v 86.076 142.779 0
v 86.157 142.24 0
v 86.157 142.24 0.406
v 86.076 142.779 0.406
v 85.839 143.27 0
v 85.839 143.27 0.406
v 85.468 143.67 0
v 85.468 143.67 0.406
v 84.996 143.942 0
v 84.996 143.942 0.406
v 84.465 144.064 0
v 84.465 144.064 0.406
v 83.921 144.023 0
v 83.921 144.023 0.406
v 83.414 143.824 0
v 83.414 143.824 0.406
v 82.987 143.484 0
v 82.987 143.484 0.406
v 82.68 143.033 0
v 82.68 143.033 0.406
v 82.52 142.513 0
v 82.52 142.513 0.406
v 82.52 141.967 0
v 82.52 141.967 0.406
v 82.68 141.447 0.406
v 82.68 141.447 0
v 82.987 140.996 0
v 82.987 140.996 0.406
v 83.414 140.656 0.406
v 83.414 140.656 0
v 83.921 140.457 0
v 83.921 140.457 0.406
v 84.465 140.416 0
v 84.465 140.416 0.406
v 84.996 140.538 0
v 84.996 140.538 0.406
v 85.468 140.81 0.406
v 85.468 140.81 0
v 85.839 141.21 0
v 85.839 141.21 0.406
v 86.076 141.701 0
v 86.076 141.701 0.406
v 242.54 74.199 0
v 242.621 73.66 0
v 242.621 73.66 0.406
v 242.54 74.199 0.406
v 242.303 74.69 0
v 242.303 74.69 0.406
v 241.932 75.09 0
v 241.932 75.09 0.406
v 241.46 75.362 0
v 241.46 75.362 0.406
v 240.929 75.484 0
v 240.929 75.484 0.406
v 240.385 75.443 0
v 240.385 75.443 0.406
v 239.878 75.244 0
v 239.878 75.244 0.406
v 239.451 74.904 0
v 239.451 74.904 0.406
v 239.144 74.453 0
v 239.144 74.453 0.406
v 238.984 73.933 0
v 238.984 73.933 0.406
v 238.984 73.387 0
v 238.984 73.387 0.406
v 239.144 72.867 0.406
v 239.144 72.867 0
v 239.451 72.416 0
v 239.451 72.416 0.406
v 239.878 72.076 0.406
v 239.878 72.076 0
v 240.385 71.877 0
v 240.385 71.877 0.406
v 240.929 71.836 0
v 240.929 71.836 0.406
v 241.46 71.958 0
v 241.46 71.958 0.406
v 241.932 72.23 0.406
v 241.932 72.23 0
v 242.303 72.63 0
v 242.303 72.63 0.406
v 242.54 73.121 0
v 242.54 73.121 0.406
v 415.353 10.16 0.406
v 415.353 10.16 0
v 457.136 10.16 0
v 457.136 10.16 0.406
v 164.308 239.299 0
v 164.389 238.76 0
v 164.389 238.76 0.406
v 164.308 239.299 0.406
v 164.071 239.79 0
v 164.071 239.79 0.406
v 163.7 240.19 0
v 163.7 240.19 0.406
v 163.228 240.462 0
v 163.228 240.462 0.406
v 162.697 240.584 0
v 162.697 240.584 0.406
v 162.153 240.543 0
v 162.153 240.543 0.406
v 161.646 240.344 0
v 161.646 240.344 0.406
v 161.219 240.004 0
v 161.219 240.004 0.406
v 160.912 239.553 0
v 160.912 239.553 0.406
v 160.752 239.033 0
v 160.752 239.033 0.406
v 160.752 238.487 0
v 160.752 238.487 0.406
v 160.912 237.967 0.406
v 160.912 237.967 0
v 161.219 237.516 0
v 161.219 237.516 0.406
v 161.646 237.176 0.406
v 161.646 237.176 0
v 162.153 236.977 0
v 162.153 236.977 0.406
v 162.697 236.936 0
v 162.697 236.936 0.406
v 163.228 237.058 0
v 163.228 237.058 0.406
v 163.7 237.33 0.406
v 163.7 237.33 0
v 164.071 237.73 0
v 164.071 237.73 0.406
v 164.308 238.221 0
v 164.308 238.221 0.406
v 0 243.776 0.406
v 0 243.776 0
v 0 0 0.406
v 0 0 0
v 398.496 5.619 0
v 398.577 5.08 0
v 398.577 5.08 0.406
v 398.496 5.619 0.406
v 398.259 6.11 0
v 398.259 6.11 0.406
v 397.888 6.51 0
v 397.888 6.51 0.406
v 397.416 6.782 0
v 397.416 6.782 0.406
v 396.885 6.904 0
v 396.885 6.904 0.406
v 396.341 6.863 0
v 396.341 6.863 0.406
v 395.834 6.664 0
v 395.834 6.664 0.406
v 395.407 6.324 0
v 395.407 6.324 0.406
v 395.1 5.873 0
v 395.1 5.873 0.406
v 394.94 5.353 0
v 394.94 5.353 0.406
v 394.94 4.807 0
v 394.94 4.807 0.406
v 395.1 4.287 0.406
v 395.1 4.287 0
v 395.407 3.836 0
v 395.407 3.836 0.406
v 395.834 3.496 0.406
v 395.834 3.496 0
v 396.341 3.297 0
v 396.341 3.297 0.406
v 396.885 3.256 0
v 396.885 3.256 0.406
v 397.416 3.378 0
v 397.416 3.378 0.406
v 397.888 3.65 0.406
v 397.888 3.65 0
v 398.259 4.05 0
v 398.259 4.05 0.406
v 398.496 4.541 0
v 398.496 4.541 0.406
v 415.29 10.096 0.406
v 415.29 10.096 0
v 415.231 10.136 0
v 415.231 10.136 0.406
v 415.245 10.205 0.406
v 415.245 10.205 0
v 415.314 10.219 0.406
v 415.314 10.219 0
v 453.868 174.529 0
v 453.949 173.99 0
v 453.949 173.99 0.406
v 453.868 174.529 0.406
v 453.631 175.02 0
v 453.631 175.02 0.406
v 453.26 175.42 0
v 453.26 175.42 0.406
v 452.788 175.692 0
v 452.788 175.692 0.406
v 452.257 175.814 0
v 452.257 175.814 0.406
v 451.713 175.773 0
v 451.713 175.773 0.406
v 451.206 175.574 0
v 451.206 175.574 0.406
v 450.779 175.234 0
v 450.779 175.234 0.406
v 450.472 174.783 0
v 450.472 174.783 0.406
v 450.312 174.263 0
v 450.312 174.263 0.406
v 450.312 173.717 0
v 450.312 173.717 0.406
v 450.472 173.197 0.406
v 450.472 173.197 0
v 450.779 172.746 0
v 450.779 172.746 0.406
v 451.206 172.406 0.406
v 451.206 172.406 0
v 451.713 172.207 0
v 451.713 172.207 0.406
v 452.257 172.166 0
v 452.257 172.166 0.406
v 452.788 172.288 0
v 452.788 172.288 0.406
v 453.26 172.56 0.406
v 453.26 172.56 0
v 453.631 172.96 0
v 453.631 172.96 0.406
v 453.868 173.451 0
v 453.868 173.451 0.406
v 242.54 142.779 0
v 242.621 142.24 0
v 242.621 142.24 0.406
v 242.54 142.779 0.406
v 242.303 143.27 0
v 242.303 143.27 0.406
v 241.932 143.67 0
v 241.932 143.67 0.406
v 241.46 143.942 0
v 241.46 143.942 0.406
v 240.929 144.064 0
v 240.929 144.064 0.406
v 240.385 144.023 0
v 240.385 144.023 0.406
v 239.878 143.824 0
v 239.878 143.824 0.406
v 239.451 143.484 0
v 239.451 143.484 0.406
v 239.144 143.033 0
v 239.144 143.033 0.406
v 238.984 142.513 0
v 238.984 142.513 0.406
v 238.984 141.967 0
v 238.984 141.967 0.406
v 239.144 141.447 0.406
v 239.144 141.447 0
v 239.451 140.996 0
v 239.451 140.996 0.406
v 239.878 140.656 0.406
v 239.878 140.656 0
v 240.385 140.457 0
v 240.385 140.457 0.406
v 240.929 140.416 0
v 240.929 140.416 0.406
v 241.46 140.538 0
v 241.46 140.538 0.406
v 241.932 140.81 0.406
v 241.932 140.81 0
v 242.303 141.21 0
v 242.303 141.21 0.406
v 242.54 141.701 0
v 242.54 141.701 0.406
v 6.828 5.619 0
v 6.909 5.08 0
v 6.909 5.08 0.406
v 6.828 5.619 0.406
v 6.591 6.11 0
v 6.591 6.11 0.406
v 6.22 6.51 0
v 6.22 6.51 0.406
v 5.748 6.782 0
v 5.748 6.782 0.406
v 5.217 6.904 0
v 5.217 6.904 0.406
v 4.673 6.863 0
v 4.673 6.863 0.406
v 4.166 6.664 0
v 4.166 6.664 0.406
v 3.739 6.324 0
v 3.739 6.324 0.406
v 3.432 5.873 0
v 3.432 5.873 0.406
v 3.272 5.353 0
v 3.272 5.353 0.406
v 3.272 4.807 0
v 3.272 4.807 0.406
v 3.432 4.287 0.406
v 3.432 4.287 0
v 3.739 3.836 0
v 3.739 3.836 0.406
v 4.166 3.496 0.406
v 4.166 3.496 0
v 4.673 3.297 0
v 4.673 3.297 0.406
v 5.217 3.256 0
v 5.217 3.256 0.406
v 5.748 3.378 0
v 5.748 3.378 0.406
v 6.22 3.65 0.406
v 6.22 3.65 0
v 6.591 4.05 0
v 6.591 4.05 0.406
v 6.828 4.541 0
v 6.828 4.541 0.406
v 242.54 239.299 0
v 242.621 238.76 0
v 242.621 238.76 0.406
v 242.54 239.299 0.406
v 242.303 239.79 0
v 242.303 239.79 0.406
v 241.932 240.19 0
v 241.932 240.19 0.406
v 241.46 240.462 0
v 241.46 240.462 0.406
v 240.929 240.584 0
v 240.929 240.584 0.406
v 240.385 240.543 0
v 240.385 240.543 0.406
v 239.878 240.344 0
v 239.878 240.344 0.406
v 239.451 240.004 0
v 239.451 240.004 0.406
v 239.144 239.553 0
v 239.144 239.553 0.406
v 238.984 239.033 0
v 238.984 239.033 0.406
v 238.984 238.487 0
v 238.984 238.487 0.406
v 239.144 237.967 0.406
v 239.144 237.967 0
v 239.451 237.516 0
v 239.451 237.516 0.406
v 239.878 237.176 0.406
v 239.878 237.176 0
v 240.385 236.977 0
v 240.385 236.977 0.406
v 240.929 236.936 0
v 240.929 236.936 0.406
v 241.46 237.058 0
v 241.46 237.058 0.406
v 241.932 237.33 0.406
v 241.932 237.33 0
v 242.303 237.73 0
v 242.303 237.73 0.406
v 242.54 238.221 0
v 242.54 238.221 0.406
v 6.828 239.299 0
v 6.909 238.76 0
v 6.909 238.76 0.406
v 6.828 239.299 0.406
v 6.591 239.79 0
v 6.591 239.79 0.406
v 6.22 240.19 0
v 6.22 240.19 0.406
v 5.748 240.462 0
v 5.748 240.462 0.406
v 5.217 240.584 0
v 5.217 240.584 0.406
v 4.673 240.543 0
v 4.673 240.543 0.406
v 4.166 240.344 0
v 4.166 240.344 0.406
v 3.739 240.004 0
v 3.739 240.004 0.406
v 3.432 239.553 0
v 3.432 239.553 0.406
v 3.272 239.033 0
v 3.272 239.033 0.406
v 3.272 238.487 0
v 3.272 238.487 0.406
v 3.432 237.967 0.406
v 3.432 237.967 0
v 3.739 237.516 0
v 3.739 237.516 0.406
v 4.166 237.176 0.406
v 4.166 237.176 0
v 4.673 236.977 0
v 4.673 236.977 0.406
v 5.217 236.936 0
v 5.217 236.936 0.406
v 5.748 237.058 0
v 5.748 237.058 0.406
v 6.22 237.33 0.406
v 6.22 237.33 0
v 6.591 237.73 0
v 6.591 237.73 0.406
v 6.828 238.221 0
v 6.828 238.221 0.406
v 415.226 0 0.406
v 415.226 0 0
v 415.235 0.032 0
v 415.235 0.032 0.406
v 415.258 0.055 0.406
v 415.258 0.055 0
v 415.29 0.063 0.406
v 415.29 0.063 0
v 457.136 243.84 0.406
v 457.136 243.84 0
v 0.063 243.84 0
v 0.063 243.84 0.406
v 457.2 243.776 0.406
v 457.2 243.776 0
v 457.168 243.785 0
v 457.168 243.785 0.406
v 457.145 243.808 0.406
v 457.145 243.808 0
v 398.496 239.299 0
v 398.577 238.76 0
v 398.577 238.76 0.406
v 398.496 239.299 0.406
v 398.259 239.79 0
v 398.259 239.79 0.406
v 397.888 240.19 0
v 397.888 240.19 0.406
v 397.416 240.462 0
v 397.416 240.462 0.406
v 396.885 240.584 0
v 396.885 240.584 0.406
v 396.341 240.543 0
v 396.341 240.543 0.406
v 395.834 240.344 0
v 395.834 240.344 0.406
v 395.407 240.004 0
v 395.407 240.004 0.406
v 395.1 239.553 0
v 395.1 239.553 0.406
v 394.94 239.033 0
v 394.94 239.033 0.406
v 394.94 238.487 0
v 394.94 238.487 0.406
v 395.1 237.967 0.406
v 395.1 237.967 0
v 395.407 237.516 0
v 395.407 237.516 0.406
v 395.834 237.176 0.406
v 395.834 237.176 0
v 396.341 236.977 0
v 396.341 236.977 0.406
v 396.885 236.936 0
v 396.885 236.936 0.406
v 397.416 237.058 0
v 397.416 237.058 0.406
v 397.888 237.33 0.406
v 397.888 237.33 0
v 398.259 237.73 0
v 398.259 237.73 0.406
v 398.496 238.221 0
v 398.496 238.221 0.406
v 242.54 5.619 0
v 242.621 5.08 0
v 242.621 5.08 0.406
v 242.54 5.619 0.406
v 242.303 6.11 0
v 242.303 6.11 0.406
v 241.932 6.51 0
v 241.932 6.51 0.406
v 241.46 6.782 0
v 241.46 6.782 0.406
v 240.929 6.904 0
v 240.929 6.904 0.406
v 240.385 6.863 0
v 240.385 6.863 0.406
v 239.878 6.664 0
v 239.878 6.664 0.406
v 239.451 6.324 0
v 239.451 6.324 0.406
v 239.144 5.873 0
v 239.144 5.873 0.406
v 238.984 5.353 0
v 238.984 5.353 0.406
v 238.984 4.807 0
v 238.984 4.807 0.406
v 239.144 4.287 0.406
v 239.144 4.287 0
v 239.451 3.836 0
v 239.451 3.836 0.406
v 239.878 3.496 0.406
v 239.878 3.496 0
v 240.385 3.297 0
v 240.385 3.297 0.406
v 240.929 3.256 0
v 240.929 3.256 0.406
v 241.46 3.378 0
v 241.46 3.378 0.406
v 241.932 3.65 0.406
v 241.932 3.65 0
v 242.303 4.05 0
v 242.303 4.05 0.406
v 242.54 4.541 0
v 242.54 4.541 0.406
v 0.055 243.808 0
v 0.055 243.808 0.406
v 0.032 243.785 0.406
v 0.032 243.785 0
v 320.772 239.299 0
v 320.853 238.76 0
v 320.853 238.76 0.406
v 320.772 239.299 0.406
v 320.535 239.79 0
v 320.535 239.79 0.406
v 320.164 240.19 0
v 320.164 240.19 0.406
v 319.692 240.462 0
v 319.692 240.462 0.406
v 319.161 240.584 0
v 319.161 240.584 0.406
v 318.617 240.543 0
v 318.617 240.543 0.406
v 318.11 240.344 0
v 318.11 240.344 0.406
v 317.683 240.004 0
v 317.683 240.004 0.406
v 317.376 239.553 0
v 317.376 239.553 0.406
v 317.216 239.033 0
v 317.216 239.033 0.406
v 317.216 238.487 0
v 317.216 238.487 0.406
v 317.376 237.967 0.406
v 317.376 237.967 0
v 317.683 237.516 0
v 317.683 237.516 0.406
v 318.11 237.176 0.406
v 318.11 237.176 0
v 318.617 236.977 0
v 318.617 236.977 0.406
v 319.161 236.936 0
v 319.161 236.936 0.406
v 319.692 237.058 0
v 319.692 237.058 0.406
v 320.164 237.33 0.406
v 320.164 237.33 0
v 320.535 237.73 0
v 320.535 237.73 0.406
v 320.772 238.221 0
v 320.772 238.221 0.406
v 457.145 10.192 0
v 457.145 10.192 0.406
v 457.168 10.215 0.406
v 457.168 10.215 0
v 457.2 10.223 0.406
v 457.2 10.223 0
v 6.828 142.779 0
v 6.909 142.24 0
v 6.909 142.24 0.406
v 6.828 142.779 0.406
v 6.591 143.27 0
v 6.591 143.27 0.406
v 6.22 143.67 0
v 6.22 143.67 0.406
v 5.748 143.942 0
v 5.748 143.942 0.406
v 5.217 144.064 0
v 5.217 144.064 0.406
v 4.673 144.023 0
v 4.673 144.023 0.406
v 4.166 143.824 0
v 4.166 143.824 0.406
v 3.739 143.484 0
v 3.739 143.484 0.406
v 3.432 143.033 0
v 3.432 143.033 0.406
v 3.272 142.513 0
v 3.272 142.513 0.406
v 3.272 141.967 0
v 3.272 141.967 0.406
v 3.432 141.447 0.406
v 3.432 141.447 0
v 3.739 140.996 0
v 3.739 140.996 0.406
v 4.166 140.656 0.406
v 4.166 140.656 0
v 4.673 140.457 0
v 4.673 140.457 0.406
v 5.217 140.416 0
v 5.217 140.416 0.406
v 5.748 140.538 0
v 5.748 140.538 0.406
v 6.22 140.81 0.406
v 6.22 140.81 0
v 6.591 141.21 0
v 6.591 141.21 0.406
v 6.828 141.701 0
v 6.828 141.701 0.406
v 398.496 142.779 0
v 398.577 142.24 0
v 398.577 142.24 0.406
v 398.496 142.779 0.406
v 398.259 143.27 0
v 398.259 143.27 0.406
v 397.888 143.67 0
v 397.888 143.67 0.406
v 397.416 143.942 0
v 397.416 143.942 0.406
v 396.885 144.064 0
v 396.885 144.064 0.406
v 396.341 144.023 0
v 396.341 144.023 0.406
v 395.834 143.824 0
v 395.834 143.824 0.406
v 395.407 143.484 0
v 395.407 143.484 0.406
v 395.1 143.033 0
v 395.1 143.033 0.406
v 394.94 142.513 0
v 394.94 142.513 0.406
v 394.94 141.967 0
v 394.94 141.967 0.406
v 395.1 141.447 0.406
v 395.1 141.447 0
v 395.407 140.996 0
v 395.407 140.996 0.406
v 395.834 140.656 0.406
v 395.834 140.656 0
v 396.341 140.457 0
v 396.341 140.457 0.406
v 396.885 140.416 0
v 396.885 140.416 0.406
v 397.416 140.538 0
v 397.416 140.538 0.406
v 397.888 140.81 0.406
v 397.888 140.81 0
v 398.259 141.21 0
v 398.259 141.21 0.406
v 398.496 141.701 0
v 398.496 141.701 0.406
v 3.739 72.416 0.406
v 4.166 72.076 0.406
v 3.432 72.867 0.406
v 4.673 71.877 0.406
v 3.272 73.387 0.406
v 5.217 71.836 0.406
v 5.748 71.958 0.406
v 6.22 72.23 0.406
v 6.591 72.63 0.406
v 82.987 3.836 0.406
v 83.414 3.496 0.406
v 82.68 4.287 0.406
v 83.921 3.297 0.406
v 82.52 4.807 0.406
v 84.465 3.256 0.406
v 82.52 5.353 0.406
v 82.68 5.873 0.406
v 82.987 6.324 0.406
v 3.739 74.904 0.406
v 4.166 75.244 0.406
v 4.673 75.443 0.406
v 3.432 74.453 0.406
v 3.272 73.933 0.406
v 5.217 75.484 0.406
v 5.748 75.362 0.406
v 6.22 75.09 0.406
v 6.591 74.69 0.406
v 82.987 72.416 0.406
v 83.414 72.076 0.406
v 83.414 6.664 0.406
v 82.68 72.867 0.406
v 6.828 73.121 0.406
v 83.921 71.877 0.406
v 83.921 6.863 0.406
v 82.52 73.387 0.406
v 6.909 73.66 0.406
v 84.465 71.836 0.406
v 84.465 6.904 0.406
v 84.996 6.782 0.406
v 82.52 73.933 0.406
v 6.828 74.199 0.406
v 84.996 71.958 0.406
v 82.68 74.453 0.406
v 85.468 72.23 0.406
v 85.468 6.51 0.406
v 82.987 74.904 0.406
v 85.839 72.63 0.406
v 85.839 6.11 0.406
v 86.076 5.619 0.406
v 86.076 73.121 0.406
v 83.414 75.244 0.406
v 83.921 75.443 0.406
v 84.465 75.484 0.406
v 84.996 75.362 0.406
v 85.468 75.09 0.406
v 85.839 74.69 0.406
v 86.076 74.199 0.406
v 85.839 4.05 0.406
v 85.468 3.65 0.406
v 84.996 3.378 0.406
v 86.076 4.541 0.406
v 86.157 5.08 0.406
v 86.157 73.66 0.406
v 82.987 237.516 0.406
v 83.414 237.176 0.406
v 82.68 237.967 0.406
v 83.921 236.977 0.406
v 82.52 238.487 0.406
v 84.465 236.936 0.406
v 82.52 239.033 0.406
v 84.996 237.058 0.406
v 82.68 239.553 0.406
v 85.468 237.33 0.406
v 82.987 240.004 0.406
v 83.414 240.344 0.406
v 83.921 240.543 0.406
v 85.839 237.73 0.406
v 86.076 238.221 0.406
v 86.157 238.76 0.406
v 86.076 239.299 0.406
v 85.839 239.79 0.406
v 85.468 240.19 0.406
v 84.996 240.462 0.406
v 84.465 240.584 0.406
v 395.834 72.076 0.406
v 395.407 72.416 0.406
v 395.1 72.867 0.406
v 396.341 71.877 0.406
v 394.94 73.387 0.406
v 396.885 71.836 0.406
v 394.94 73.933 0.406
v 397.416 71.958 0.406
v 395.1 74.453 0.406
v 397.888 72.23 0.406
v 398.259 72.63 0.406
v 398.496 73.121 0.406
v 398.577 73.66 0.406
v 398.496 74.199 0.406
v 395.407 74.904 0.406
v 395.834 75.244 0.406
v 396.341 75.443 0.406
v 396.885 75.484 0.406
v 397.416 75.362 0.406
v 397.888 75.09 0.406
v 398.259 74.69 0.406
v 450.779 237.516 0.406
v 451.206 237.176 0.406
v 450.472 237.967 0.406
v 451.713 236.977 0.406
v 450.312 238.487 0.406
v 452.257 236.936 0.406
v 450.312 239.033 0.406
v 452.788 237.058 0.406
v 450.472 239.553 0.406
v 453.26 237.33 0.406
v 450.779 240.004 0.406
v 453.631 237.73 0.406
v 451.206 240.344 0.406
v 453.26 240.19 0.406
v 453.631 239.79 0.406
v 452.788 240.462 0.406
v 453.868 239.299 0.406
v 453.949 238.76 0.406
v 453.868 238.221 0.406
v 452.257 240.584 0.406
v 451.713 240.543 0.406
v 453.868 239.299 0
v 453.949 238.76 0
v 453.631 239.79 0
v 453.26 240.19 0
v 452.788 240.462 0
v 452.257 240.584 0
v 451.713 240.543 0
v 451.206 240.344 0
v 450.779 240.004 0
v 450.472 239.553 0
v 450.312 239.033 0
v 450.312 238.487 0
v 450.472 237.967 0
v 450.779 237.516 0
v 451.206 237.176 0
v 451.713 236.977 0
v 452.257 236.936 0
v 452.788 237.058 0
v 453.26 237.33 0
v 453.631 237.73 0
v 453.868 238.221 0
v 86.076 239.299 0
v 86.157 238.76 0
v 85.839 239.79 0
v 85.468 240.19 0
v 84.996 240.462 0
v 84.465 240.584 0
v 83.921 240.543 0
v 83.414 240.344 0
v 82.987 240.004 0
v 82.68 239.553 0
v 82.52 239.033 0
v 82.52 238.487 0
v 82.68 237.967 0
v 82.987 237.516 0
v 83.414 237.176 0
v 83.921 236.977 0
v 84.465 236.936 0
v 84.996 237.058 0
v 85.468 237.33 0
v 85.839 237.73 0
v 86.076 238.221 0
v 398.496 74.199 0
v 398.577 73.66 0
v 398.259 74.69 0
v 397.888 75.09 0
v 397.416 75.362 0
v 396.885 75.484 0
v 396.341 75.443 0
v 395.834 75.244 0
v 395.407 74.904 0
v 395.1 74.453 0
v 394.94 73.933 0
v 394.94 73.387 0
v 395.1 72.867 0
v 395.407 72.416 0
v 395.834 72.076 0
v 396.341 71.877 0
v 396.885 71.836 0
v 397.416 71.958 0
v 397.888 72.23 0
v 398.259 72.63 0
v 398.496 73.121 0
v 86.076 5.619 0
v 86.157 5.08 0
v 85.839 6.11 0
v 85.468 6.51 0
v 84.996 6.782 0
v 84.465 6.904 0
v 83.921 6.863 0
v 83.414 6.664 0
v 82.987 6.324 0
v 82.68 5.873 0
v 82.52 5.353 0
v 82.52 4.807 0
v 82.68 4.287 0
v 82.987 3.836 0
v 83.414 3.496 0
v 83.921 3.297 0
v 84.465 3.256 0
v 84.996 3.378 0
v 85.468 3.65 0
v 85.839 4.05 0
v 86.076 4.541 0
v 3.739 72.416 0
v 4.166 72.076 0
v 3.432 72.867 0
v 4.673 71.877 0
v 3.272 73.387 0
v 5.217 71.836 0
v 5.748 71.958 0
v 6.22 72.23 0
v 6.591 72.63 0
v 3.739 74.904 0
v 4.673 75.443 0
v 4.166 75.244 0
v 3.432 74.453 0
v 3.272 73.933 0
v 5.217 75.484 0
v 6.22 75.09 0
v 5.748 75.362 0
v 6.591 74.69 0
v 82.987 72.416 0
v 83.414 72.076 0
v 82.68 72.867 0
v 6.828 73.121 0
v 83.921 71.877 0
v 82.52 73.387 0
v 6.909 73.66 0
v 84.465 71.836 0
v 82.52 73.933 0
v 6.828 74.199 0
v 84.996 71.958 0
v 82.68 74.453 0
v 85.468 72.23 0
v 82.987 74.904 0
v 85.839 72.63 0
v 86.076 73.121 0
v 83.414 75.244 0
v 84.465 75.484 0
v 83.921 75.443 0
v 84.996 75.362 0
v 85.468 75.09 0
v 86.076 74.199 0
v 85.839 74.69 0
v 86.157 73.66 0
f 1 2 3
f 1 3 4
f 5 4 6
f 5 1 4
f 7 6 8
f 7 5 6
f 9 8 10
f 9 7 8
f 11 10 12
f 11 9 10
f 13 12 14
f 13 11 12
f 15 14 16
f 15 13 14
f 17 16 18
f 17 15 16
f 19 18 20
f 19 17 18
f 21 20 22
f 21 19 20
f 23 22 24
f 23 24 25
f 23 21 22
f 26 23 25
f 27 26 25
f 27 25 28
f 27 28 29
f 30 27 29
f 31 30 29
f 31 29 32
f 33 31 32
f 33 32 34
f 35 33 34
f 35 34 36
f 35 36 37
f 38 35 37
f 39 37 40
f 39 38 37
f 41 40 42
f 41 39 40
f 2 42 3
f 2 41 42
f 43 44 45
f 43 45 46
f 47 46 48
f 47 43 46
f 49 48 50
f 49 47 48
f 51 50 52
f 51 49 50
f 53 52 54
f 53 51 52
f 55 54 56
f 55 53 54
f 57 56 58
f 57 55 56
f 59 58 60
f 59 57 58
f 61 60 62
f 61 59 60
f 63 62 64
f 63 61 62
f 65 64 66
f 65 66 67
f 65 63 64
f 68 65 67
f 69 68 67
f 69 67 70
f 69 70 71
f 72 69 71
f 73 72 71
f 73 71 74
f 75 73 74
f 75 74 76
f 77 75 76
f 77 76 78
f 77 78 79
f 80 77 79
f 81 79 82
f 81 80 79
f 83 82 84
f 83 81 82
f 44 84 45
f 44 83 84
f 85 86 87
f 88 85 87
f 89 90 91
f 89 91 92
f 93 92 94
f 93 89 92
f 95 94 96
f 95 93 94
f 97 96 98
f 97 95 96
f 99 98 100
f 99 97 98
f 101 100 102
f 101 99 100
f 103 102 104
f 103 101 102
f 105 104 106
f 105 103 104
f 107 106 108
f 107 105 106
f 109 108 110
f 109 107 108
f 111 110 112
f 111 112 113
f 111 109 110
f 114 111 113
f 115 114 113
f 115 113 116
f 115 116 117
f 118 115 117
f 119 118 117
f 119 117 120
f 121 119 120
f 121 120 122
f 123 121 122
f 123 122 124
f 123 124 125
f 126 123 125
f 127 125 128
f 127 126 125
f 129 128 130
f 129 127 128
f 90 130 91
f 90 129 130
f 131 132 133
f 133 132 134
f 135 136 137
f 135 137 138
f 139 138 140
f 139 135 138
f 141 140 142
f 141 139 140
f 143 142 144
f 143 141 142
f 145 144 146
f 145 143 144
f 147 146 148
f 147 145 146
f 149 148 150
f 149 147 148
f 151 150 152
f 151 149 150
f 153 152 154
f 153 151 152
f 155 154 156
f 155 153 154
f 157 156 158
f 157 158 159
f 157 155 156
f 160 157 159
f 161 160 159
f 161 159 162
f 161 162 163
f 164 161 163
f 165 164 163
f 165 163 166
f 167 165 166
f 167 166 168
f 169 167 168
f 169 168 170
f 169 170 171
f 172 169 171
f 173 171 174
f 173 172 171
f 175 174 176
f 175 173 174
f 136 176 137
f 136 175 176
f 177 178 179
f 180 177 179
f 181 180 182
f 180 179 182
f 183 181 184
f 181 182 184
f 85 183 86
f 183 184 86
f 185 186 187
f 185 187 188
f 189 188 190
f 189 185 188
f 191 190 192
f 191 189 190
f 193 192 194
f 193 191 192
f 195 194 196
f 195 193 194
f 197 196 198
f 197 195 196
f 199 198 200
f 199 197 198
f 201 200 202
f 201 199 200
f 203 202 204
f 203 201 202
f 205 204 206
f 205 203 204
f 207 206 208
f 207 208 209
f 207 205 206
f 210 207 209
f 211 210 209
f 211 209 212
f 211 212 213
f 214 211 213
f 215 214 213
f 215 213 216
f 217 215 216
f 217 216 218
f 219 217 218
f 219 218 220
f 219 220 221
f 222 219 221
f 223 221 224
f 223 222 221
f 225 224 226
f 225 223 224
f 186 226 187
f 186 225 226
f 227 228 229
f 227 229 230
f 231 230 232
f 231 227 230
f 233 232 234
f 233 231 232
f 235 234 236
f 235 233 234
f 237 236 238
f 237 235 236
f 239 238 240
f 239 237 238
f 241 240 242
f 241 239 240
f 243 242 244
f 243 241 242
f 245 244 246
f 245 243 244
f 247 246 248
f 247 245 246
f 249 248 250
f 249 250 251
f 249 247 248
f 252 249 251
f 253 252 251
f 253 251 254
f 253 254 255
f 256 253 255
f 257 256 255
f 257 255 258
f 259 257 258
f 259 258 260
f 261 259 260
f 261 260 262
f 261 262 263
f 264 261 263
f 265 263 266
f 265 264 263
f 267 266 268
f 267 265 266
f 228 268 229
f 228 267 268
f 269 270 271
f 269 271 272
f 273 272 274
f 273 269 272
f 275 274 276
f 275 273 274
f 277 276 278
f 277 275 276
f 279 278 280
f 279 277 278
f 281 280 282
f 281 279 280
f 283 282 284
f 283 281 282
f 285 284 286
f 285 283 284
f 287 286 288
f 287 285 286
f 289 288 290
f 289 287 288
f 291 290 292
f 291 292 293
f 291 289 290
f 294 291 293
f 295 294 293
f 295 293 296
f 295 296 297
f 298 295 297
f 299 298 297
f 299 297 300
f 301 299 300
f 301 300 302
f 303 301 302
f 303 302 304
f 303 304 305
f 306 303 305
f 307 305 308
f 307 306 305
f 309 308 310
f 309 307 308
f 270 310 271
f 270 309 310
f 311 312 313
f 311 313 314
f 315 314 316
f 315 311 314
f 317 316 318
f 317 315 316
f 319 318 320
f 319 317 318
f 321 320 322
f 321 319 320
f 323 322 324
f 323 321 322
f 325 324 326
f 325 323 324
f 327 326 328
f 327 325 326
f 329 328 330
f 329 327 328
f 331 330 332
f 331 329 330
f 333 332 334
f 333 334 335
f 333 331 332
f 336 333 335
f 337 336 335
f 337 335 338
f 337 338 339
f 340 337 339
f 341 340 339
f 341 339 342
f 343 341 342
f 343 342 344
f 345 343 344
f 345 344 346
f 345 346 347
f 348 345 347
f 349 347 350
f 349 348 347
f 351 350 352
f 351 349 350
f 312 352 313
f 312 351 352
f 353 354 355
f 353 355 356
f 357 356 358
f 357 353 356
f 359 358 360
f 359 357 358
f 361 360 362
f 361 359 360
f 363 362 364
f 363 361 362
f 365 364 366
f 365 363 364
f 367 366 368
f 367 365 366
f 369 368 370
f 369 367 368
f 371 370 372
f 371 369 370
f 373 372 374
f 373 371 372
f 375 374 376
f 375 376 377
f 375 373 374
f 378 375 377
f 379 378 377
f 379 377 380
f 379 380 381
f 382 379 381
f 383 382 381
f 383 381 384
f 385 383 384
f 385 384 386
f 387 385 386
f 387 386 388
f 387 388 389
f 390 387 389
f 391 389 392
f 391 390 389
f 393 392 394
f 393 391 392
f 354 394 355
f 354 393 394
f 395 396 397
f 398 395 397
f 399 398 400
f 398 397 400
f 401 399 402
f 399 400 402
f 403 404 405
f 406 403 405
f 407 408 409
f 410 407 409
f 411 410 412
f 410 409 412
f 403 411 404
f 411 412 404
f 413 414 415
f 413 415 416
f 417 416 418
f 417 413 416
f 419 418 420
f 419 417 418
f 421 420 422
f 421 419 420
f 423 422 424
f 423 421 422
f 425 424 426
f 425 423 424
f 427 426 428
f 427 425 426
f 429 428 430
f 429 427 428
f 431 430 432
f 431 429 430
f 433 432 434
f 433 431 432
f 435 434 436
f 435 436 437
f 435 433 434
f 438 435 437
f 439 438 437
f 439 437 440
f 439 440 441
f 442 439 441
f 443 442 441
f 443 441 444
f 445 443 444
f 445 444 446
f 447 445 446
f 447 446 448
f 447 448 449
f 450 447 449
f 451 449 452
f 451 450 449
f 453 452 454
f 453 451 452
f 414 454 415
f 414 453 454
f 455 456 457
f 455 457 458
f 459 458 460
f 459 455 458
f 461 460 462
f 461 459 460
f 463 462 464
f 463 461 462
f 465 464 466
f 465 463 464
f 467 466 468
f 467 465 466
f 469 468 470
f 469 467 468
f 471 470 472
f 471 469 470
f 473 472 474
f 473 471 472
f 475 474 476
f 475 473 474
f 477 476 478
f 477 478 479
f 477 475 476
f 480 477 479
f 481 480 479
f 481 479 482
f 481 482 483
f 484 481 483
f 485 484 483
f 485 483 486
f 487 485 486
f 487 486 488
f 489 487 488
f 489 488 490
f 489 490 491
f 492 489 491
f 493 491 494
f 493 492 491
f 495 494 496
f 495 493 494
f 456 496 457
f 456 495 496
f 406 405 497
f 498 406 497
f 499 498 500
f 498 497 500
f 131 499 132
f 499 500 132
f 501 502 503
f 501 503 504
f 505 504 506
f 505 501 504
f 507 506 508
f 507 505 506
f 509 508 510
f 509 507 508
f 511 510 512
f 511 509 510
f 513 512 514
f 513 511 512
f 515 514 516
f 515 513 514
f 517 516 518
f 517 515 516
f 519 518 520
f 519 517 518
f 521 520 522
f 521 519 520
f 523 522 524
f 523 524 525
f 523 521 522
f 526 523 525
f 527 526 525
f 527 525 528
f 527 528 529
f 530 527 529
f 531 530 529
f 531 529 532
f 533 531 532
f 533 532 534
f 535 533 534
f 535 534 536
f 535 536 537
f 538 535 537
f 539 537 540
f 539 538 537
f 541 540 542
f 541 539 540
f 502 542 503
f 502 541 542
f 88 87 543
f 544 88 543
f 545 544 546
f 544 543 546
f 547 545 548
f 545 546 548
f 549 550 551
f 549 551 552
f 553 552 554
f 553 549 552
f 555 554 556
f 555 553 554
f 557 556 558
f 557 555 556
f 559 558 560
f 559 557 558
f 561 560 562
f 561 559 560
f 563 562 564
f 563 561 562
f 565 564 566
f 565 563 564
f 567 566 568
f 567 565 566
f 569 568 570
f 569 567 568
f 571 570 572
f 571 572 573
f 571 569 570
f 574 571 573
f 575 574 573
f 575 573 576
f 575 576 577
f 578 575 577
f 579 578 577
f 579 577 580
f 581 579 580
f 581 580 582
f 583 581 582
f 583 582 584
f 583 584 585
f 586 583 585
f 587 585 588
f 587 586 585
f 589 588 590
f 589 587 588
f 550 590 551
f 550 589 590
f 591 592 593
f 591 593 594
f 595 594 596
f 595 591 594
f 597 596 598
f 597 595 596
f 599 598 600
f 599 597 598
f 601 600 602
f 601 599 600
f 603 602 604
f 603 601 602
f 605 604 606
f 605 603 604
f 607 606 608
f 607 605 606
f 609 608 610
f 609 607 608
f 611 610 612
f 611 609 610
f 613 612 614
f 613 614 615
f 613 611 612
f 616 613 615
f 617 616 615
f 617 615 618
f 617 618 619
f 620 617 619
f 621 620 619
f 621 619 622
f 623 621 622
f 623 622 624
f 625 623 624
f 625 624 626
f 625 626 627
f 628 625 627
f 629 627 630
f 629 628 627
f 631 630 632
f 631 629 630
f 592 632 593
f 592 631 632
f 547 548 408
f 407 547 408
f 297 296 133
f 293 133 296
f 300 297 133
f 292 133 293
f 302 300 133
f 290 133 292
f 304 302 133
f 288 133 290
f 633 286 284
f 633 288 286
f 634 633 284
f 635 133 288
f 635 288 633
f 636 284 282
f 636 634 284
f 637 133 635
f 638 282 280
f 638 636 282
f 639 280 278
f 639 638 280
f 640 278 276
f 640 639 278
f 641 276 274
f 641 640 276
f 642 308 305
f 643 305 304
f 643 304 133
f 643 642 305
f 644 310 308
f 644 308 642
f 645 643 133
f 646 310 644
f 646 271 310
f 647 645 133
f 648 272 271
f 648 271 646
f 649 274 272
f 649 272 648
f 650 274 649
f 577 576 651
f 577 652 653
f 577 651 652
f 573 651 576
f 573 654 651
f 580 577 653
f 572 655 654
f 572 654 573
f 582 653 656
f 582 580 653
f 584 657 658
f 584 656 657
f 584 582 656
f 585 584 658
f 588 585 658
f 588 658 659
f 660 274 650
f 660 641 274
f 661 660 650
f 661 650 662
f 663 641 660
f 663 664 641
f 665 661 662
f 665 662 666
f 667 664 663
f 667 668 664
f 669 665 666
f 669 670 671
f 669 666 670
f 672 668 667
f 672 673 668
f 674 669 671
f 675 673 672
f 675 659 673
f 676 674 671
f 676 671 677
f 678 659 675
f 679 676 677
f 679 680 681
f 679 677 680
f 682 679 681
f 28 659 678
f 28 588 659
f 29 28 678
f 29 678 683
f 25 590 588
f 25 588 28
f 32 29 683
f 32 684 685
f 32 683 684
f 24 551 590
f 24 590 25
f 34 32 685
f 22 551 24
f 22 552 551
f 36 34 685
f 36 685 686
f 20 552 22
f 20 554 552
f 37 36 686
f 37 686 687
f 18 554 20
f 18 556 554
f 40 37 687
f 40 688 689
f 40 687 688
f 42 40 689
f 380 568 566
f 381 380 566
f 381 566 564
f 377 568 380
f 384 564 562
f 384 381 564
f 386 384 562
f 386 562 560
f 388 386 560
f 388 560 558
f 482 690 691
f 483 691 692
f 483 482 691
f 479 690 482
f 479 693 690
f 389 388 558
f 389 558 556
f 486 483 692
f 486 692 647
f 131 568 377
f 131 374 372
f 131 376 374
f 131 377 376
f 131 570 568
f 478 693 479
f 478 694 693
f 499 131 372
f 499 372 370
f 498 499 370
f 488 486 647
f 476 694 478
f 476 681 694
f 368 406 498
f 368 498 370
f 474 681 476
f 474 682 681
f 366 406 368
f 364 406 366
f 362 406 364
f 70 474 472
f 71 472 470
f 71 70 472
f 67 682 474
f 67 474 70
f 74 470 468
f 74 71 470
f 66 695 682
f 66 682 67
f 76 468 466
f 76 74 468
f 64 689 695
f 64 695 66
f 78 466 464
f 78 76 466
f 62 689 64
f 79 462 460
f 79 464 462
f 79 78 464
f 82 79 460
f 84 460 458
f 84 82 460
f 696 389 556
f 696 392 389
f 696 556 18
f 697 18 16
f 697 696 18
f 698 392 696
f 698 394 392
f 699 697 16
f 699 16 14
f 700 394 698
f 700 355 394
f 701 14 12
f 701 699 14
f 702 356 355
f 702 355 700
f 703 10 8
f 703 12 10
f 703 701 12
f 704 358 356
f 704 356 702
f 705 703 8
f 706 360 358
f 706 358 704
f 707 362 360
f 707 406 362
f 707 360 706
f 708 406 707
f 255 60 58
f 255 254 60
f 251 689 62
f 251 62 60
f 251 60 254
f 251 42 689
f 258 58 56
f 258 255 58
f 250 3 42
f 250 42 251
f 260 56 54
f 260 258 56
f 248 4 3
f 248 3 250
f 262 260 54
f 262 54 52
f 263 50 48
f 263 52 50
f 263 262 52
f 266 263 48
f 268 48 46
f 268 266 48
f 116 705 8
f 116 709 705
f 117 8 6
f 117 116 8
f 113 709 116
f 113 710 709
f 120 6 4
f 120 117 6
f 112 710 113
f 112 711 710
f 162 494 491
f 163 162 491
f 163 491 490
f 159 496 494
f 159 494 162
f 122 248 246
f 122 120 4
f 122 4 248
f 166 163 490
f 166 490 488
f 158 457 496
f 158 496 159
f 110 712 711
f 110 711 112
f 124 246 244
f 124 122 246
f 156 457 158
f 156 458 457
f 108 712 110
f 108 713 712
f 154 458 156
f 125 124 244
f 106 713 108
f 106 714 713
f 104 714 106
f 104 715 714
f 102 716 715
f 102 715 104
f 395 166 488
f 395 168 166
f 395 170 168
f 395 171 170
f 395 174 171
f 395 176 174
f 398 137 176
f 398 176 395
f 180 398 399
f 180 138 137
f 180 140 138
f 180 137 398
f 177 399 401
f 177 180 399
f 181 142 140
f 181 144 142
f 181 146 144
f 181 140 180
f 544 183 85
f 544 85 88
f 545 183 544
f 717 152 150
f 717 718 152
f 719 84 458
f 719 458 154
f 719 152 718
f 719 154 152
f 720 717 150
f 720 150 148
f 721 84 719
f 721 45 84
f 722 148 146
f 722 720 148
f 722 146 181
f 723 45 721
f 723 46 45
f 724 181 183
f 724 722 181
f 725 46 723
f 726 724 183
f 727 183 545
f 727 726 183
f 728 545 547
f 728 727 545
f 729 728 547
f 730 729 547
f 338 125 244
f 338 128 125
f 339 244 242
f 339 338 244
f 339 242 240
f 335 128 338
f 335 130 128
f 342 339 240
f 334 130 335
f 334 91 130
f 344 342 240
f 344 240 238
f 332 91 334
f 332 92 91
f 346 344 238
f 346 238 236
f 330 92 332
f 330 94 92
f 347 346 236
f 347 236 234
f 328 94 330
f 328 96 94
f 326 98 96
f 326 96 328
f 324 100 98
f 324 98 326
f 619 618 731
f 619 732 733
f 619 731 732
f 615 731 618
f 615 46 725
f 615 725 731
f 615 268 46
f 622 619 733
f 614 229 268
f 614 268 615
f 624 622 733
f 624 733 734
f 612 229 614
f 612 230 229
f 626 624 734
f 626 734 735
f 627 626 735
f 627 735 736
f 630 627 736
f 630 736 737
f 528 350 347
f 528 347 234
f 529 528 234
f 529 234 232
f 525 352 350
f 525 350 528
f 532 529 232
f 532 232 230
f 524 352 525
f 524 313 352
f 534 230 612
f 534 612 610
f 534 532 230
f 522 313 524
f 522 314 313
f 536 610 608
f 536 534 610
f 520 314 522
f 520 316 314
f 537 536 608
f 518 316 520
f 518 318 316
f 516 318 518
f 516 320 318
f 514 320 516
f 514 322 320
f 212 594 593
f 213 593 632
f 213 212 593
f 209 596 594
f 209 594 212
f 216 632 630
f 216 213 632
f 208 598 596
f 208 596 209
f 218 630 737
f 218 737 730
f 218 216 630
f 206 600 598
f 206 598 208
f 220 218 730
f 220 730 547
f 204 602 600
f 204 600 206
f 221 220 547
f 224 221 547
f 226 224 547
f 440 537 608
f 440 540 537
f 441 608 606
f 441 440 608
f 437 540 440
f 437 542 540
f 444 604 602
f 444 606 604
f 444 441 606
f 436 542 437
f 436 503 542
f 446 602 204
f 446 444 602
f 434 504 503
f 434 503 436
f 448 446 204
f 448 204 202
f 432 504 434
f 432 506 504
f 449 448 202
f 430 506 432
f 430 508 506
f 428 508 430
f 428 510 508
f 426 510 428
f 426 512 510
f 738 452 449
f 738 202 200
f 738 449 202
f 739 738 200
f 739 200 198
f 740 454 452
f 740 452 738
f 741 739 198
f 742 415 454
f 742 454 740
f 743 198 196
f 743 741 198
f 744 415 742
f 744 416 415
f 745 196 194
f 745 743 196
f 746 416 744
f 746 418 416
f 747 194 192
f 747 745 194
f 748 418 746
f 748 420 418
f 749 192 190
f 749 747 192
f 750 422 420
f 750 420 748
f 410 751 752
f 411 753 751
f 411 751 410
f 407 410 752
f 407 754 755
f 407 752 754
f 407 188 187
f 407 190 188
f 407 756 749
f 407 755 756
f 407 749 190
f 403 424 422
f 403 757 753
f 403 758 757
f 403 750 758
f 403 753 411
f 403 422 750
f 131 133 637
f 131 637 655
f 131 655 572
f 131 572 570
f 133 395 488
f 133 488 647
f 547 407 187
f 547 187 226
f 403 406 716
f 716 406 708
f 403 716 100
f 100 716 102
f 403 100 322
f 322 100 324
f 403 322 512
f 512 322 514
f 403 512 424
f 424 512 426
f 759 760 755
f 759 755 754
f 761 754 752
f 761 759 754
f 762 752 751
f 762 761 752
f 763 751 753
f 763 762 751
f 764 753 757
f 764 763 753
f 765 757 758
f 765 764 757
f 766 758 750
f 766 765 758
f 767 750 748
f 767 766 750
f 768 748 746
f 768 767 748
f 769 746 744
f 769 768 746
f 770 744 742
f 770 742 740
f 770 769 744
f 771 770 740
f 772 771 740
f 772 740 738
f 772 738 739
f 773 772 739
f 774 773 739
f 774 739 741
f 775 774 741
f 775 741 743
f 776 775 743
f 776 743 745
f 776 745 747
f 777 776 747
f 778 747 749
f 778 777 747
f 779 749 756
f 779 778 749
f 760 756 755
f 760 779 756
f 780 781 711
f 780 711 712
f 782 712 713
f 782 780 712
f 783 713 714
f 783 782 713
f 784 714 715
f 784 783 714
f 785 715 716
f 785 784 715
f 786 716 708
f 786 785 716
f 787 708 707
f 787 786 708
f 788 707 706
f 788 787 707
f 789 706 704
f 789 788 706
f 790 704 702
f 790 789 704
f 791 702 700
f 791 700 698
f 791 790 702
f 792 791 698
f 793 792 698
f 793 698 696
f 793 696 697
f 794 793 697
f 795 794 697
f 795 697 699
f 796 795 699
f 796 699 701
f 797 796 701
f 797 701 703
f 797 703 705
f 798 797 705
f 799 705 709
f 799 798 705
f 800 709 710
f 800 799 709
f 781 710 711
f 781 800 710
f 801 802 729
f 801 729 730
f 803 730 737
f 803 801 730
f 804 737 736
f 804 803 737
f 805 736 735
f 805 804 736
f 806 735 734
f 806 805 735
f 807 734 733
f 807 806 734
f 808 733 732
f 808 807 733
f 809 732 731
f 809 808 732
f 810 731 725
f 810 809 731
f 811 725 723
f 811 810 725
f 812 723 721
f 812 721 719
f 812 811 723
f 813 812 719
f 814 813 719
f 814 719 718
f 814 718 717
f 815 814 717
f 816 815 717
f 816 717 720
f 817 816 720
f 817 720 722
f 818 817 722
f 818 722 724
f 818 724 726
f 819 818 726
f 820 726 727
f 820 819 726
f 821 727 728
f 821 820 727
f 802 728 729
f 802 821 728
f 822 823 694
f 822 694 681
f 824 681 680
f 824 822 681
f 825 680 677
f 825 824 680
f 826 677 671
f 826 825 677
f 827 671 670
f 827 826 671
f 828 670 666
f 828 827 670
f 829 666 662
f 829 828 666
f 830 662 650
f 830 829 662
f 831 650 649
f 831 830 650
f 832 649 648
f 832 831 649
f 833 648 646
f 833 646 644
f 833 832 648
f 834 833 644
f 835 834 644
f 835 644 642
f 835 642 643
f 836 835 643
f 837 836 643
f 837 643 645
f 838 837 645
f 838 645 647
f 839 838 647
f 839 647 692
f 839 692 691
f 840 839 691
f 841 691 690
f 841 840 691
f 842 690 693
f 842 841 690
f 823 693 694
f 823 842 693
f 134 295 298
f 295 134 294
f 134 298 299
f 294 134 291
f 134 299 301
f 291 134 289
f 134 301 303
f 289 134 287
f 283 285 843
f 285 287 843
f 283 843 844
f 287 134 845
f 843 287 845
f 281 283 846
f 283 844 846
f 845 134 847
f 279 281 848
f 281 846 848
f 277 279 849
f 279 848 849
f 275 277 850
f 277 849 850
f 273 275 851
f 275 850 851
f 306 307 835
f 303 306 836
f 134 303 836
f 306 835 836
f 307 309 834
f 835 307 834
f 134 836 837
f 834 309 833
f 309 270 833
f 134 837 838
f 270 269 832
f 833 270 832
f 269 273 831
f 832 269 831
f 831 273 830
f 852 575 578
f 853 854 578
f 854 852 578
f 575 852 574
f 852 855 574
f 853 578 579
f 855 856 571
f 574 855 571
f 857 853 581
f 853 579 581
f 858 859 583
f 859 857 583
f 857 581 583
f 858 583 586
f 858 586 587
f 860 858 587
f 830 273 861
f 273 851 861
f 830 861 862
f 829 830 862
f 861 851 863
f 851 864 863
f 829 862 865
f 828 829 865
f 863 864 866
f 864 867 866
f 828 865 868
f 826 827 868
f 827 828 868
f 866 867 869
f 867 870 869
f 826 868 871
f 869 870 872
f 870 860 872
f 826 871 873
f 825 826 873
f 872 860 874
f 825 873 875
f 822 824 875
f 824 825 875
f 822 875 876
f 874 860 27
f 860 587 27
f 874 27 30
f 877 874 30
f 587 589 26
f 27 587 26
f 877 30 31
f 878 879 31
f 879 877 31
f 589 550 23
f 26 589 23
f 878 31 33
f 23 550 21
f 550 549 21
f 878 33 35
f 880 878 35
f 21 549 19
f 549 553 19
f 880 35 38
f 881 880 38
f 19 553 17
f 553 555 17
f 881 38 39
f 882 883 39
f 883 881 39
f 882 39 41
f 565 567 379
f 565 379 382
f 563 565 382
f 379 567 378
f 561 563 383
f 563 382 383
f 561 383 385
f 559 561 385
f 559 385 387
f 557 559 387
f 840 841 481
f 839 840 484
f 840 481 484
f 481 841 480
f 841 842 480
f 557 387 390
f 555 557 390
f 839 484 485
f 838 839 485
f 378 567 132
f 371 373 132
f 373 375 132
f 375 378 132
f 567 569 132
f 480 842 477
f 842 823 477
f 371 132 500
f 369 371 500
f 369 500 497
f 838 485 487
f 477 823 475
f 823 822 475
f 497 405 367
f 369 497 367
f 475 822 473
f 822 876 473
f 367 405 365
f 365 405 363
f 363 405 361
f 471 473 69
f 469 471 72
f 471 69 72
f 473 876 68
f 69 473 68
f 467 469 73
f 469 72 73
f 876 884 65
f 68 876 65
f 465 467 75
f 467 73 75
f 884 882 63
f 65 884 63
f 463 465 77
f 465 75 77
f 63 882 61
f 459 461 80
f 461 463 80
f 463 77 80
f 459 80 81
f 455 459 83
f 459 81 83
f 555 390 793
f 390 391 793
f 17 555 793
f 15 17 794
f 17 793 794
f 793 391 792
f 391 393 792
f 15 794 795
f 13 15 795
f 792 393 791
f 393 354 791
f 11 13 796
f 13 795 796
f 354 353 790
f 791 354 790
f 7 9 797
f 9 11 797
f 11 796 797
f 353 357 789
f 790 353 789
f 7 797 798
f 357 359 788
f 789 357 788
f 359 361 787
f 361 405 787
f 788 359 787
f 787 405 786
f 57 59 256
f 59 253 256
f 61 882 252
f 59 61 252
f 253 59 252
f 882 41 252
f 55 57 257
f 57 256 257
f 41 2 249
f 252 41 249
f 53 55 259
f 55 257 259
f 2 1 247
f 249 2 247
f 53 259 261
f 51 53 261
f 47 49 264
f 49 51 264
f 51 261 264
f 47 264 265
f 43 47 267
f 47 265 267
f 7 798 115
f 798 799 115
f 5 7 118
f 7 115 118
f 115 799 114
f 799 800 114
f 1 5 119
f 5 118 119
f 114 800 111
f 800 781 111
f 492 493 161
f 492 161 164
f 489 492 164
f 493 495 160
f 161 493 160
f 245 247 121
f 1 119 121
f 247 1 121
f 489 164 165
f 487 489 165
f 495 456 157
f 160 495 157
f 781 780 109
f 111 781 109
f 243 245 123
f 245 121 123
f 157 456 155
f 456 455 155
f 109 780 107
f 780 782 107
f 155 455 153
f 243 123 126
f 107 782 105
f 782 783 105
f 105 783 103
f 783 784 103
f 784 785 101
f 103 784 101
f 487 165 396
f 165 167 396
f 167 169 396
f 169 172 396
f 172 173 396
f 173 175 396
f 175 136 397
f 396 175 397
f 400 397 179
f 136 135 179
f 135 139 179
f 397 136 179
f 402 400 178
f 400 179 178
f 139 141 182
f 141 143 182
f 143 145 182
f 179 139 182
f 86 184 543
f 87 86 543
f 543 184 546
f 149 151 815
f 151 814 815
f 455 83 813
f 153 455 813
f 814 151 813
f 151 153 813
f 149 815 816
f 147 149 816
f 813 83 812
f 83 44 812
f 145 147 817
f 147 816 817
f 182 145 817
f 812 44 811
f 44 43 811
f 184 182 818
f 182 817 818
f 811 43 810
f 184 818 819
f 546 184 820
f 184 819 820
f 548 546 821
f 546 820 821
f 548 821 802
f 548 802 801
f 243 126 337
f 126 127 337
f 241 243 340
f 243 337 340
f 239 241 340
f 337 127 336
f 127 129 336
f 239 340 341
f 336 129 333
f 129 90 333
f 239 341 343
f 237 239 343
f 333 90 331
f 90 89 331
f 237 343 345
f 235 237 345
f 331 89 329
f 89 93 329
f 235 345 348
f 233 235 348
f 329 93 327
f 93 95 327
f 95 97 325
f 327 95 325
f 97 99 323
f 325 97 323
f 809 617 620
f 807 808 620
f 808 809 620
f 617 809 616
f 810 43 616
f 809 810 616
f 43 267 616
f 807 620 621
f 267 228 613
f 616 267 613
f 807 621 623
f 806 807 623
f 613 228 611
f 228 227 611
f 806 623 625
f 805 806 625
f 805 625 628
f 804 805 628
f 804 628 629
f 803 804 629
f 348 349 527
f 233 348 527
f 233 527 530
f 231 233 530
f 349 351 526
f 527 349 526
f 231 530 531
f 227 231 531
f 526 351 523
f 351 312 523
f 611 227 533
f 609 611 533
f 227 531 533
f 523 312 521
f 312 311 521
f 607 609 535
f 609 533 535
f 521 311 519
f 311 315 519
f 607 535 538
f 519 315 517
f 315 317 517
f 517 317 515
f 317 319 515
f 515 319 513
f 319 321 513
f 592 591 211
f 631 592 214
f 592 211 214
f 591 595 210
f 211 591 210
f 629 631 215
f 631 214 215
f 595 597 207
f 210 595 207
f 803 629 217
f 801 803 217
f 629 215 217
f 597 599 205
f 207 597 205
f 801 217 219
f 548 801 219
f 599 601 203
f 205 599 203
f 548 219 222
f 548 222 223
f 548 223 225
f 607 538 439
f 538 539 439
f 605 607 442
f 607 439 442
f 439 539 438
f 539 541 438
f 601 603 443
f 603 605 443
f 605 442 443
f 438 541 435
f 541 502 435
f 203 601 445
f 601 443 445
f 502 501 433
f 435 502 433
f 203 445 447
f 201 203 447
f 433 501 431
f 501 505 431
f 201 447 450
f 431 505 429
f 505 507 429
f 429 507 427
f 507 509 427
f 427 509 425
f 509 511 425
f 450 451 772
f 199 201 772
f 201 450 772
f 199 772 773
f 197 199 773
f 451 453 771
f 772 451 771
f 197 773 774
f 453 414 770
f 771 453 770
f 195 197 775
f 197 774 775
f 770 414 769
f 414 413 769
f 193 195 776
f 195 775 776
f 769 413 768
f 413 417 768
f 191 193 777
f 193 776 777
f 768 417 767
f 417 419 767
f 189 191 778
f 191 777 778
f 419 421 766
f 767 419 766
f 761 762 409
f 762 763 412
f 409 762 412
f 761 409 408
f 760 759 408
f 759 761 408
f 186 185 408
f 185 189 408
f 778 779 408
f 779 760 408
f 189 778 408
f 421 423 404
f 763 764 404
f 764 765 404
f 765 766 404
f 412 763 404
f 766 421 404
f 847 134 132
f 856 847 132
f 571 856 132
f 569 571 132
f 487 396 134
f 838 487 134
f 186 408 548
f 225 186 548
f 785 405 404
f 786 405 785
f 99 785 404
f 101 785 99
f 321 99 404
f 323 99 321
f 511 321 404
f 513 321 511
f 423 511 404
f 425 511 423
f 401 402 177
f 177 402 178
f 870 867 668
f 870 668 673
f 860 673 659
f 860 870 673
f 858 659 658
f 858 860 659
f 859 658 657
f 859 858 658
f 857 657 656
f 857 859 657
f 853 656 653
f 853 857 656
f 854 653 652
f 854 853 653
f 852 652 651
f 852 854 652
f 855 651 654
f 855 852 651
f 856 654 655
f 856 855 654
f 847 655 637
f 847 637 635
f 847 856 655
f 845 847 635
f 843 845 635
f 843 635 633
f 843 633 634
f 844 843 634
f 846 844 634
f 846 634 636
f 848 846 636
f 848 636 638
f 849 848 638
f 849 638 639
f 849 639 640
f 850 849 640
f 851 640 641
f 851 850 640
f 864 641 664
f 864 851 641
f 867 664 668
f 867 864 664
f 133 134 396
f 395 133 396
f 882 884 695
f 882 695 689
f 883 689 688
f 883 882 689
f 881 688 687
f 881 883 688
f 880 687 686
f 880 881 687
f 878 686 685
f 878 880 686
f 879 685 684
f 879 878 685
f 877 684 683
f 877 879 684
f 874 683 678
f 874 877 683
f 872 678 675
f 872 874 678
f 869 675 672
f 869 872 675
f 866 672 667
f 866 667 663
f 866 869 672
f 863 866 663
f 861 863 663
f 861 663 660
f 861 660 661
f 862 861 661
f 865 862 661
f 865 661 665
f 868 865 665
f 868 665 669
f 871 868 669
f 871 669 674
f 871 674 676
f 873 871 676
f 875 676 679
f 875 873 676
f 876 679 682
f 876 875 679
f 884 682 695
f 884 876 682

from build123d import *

# Parameters (mm, degrees)
MODEL_R             = 1.8288
BOSS_EXTRUDE2_DEPTH = 0.4064


with BuildPart() as part:
    # Model → Boss-Extrude2 (new body)
    with BuildSketch(Plane.XY):
        with BuildLine():
            Line((0, 243.7765), (0, 0))
            Line((0, 0), (415.2265, 0))
            ThreePointArc((415.2265, 0), (415.245098719, 0.044901281), (415.29, 0.0635))
            Line((415.29, 0.0635), (415.29, 10.0965))
            ThreePointArc((415.29, 10.0965), (415.245098719, 10.204901281), (415.3535, 10.16))
            Line((415.3535, 10.16), (457.1365, 10.16))
            ThreePointArc((457.1365, 10.16), (457.155098719, 10.204901281), (457.2, 10.2235))
            Line((457.2, 10.2235), (457.2, 243.7765))
            ThreePointArc((457.2, 243.7765), (457.155098719, 243.795098719), (457.1365, 243.84))
            Line((457.1365, 243.84), (0.0635, 243.84))
            ThreePointArc((0.0635, 243.84), (0.044901281, 243.795098719), (0, 243.7765))
        make_face()
        with Locations((5.08, 5.08)):
            Circle(MODEL_R, mode=Mode.SUBTRACT)
        with Locations((84.328, 5.08)):
            Circle(MODEL_R, mode=Mode.SUBTRACT)
        with Locations((5.08, 73.66)):
            Circle(MODEL_R, mode=Mode.SUBTRACT)
        with Locations((84.328, 73.66)):
            Circle(MODEL_R, mode=Mode.SUBTRACT)
        with Locations((240.792, 5.08)):
            Circle(MODEL_R, mode=Mode.SUBTRACT)
        with Locations((396.748, 5.08)):
            Circle(MODEL_R, mode=Mode.SUBTRACT)
        with Locations((240.792, 73.66)):
            Circle(MODEL_R, mode=Mode.SUBTRACT)
        with Locations((396.748, 73.66)):
            Circle(MODEL_R, mode=Mode.SUBTRACT)
        with Locations((5.08, 142.24)):
            Circle(MODEL_R, mode=Mode.SUBTRACT)
        with Locations((84.328, 142.24)):
            Circle(MODEL_R, mode=Mode.SUBTRACT)
        with Locations((5.08, 238.76)):
            Circle(MODEL_R, mode=Mode.SUBTRACT)
        with Locations((84.328, 238.76)):
            Circle(MODEL_R, mode=Mode.SUBTRACT)
        with Locations((162.56, 238.76)):
            Circle(MODEL_R, mode=Mode.SUBTRACT)
        with Locations((240.792, 142.24)):
            Circle(MODEL_R, mode=Mode.SUBTRACT)
        with Locations((396.748, 142.24)):
            Circle(MODEL_R, mode=Mode.SUBTRACT)
        with Locations((452.12, 173.99)):
            Circle(MODEL_R, mode=Mode.SUBTRACT)
        with Locations((240.792, 238.76)):
            Circle(MODEL_R, mode=Mode.SUBTRACT)
        with Locations((319.024, 238.76)):
            Circle(MODEL_R, mode=Mode.SUBTRACT)
        with Locations((396.748, 238.76)):
            Circle(MODEL_R, mode=Mode.SUBTRACT)
        with Locations((452.12, 238.76)):
            Circle(MODEL_R, mode=Mode.SUBTRACT)
    extrude(amount=BOSS_EXTRUDE2_DEPTH)


solid = part.part
